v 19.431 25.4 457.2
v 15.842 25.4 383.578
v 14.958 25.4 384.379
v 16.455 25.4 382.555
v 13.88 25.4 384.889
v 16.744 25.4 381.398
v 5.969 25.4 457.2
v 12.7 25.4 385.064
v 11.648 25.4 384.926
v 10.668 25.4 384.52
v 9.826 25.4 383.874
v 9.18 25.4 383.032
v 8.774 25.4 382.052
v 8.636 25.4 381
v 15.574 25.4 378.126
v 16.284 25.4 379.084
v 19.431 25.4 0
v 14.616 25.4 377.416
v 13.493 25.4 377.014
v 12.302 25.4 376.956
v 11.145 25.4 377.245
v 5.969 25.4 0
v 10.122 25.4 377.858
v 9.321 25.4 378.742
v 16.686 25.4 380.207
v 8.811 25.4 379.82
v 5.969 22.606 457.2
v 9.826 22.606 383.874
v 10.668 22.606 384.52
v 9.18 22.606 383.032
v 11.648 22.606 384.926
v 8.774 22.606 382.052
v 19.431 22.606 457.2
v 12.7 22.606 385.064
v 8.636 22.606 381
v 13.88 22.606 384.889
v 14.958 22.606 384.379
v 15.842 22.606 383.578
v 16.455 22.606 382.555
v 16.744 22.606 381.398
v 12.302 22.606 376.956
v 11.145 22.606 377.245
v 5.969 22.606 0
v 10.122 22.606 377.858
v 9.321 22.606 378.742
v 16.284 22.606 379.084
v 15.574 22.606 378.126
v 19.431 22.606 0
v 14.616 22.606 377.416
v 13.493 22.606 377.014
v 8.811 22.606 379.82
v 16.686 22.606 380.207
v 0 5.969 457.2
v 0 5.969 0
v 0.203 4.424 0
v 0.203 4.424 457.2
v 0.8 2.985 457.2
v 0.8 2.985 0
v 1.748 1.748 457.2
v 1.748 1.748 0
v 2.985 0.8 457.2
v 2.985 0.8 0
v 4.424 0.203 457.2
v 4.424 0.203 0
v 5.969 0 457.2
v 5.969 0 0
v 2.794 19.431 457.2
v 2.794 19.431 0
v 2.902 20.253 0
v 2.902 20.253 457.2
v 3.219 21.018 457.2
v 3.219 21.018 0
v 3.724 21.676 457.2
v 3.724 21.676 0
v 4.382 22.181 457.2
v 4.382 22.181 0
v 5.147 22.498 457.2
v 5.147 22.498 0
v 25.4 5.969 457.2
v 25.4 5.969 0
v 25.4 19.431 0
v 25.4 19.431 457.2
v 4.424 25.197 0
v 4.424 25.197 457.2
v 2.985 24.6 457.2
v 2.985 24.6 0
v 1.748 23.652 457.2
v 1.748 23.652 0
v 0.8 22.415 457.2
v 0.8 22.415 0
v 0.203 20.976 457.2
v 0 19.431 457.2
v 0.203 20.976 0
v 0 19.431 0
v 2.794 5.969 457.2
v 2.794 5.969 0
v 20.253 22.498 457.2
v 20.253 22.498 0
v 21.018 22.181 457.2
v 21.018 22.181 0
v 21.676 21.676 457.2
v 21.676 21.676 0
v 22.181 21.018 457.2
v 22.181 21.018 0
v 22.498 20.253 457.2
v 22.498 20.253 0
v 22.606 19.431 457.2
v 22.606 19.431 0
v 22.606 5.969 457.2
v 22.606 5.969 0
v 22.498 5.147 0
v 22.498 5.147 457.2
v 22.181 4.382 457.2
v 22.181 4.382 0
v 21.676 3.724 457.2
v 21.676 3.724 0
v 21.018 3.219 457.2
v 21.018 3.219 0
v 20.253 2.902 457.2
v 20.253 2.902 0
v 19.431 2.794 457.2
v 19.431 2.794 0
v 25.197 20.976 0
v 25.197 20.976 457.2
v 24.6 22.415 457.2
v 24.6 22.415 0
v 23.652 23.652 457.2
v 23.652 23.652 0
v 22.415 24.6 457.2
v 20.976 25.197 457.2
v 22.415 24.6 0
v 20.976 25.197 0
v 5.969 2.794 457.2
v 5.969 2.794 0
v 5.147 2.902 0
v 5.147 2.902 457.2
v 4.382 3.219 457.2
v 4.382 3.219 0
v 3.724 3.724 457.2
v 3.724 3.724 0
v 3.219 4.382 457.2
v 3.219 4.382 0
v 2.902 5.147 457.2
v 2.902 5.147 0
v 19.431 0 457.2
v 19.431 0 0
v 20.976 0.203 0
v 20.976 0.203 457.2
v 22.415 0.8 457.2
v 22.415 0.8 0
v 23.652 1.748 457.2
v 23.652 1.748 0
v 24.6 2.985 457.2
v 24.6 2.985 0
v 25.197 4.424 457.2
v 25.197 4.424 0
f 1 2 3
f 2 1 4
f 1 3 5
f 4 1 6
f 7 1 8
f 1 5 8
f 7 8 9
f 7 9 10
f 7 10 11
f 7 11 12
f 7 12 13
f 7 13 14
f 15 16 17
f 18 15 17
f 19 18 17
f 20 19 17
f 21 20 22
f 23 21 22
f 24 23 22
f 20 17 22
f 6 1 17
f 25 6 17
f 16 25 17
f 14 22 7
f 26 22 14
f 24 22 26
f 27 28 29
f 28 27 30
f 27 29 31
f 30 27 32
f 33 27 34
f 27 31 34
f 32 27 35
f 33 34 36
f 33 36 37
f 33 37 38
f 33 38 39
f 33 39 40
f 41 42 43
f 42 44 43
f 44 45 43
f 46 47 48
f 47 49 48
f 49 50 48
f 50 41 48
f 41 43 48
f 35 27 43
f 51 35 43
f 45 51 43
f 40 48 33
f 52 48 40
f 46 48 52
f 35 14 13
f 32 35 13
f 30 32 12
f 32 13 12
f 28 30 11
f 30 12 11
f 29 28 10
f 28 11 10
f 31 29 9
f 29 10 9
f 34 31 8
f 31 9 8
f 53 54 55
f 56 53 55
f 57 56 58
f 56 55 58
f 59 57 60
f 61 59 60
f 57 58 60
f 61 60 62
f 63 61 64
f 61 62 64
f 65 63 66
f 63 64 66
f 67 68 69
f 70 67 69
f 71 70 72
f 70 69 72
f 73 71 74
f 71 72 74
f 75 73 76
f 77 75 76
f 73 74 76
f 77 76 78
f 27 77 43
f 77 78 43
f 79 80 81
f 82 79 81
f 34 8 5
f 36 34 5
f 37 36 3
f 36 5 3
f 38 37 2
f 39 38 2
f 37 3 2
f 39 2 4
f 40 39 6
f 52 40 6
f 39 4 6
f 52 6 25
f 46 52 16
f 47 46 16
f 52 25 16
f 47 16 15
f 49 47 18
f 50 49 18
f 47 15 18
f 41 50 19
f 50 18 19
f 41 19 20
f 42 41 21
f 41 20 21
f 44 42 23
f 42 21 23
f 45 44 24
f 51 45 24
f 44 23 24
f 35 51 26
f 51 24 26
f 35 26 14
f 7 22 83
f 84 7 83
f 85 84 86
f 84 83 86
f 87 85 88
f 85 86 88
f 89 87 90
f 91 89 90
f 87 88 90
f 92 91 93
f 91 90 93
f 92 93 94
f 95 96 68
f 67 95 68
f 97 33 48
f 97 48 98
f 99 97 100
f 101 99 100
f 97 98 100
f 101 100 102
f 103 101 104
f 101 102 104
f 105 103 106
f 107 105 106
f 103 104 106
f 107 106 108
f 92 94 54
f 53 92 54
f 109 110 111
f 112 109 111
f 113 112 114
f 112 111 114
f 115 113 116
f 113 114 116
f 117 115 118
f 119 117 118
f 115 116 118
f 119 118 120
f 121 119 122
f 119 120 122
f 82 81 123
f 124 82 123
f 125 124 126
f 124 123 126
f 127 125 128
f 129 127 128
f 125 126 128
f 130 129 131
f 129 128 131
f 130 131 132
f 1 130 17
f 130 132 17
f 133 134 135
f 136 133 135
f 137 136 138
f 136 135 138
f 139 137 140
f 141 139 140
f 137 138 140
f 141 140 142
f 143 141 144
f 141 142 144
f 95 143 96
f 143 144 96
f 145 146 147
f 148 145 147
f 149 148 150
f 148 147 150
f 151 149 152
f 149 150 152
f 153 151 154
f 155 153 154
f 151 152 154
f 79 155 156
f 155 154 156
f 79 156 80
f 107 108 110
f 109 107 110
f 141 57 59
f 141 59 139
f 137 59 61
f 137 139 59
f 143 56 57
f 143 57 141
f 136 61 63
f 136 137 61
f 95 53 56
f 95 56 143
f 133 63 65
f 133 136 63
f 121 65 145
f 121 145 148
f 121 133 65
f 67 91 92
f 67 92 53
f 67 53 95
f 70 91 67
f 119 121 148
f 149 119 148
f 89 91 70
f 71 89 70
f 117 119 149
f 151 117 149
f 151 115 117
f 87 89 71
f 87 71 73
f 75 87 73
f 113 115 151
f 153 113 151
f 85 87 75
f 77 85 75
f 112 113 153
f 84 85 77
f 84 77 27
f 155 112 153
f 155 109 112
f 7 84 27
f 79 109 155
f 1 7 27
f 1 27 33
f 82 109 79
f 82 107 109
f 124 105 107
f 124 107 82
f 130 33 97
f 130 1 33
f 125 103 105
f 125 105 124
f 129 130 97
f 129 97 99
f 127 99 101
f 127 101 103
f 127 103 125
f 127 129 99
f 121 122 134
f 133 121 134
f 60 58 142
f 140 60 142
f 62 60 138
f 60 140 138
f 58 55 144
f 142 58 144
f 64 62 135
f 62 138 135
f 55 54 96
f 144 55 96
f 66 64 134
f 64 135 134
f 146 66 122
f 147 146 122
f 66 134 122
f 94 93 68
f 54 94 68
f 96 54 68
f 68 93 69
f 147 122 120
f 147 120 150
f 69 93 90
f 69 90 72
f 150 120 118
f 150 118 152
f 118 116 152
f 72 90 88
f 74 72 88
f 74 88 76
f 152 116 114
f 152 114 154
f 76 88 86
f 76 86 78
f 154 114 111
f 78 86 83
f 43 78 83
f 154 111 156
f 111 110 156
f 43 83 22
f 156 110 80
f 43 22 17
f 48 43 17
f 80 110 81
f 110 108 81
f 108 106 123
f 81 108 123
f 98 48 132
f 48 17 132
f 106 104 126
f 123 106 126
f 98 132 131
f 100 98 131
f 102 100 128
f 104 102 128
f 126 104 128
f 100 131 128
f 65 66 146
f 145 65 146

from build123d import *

# Parameters (mm, degrees)
F1_DEPTH = 457.2
F3_DEPTH = 2.794


with BuildPart() as f1:
    # F0 (on Top) → F1 (new body)
    with BuildSketch(Plane.XY):
        with BuildLine():
            ThreePointArc((0, 5.969), (1.74828, 1.74828), (5.969, 0))
            Line((5.969, 0), (19.431, 0))
            ThreePointArc((19.431, 0), (23.65172, 1.74828), (25.4, 5.969))
            Line((25.4, 5.969), (25.4, 19.431))
            ThreePointArc((25.4, 19.431), (23.65172, 23.65172), (19.431, 25.4))
            Line((19.431, 25.4), (5.969, 25.4))
            ThreePointArc((5.969, 25.4), (1.74828, 23.65172), (0, 19.431))
            Line((0, 19.431), (0, 5.969))
        make_face()
        with BuildLine():
            ThreePointArc((2.794, 19.431), (3.723936, 21.676064), (5.969, 22.606))
            Line((5.969, 22.606), (19.431, 22.606))
            ThreePointArc((19.431, 22.606), (21.676064, 21.676064), (22.606, 19.431))
            Line((22.606, 19.431), (22.606, 5.969))
            ThreePointArc((22.606, 5.969), (21.676064, 3.723936), (19.431, 2.794))
            Line((19.431, 2.794), (5.969, 2.794))
            ThreePointArc((5.969, 2.794), (3.723936, 3.723936), (2.794, 5.969))
            Line((2.794, 5.969), (2.794, 19.431))
        make_face(mode=Mode.SUBTRACT)
    extrude(amount=F1_DEPTH)

    # F2 (on face) → F3 (cut, through all)
    with BuildSketch(Plane(origin=(0, 25.4, 0), x_dir=(-1, 0, 0), z_dir=(0, 1, 0))):
        with BuildLine():
            ThreePointArc((-8.636, 381), (-9.826318, 383.873682), (-12.7, 385.064))
            ThreePointArc((-12.7, 385.064), (-15.573682, 378.126318), (-8.636, 381))
        make_face()
    extrude(amount=-F3_DEPTH, mode=Mode.SUBTRACT)


solid = f1.part
